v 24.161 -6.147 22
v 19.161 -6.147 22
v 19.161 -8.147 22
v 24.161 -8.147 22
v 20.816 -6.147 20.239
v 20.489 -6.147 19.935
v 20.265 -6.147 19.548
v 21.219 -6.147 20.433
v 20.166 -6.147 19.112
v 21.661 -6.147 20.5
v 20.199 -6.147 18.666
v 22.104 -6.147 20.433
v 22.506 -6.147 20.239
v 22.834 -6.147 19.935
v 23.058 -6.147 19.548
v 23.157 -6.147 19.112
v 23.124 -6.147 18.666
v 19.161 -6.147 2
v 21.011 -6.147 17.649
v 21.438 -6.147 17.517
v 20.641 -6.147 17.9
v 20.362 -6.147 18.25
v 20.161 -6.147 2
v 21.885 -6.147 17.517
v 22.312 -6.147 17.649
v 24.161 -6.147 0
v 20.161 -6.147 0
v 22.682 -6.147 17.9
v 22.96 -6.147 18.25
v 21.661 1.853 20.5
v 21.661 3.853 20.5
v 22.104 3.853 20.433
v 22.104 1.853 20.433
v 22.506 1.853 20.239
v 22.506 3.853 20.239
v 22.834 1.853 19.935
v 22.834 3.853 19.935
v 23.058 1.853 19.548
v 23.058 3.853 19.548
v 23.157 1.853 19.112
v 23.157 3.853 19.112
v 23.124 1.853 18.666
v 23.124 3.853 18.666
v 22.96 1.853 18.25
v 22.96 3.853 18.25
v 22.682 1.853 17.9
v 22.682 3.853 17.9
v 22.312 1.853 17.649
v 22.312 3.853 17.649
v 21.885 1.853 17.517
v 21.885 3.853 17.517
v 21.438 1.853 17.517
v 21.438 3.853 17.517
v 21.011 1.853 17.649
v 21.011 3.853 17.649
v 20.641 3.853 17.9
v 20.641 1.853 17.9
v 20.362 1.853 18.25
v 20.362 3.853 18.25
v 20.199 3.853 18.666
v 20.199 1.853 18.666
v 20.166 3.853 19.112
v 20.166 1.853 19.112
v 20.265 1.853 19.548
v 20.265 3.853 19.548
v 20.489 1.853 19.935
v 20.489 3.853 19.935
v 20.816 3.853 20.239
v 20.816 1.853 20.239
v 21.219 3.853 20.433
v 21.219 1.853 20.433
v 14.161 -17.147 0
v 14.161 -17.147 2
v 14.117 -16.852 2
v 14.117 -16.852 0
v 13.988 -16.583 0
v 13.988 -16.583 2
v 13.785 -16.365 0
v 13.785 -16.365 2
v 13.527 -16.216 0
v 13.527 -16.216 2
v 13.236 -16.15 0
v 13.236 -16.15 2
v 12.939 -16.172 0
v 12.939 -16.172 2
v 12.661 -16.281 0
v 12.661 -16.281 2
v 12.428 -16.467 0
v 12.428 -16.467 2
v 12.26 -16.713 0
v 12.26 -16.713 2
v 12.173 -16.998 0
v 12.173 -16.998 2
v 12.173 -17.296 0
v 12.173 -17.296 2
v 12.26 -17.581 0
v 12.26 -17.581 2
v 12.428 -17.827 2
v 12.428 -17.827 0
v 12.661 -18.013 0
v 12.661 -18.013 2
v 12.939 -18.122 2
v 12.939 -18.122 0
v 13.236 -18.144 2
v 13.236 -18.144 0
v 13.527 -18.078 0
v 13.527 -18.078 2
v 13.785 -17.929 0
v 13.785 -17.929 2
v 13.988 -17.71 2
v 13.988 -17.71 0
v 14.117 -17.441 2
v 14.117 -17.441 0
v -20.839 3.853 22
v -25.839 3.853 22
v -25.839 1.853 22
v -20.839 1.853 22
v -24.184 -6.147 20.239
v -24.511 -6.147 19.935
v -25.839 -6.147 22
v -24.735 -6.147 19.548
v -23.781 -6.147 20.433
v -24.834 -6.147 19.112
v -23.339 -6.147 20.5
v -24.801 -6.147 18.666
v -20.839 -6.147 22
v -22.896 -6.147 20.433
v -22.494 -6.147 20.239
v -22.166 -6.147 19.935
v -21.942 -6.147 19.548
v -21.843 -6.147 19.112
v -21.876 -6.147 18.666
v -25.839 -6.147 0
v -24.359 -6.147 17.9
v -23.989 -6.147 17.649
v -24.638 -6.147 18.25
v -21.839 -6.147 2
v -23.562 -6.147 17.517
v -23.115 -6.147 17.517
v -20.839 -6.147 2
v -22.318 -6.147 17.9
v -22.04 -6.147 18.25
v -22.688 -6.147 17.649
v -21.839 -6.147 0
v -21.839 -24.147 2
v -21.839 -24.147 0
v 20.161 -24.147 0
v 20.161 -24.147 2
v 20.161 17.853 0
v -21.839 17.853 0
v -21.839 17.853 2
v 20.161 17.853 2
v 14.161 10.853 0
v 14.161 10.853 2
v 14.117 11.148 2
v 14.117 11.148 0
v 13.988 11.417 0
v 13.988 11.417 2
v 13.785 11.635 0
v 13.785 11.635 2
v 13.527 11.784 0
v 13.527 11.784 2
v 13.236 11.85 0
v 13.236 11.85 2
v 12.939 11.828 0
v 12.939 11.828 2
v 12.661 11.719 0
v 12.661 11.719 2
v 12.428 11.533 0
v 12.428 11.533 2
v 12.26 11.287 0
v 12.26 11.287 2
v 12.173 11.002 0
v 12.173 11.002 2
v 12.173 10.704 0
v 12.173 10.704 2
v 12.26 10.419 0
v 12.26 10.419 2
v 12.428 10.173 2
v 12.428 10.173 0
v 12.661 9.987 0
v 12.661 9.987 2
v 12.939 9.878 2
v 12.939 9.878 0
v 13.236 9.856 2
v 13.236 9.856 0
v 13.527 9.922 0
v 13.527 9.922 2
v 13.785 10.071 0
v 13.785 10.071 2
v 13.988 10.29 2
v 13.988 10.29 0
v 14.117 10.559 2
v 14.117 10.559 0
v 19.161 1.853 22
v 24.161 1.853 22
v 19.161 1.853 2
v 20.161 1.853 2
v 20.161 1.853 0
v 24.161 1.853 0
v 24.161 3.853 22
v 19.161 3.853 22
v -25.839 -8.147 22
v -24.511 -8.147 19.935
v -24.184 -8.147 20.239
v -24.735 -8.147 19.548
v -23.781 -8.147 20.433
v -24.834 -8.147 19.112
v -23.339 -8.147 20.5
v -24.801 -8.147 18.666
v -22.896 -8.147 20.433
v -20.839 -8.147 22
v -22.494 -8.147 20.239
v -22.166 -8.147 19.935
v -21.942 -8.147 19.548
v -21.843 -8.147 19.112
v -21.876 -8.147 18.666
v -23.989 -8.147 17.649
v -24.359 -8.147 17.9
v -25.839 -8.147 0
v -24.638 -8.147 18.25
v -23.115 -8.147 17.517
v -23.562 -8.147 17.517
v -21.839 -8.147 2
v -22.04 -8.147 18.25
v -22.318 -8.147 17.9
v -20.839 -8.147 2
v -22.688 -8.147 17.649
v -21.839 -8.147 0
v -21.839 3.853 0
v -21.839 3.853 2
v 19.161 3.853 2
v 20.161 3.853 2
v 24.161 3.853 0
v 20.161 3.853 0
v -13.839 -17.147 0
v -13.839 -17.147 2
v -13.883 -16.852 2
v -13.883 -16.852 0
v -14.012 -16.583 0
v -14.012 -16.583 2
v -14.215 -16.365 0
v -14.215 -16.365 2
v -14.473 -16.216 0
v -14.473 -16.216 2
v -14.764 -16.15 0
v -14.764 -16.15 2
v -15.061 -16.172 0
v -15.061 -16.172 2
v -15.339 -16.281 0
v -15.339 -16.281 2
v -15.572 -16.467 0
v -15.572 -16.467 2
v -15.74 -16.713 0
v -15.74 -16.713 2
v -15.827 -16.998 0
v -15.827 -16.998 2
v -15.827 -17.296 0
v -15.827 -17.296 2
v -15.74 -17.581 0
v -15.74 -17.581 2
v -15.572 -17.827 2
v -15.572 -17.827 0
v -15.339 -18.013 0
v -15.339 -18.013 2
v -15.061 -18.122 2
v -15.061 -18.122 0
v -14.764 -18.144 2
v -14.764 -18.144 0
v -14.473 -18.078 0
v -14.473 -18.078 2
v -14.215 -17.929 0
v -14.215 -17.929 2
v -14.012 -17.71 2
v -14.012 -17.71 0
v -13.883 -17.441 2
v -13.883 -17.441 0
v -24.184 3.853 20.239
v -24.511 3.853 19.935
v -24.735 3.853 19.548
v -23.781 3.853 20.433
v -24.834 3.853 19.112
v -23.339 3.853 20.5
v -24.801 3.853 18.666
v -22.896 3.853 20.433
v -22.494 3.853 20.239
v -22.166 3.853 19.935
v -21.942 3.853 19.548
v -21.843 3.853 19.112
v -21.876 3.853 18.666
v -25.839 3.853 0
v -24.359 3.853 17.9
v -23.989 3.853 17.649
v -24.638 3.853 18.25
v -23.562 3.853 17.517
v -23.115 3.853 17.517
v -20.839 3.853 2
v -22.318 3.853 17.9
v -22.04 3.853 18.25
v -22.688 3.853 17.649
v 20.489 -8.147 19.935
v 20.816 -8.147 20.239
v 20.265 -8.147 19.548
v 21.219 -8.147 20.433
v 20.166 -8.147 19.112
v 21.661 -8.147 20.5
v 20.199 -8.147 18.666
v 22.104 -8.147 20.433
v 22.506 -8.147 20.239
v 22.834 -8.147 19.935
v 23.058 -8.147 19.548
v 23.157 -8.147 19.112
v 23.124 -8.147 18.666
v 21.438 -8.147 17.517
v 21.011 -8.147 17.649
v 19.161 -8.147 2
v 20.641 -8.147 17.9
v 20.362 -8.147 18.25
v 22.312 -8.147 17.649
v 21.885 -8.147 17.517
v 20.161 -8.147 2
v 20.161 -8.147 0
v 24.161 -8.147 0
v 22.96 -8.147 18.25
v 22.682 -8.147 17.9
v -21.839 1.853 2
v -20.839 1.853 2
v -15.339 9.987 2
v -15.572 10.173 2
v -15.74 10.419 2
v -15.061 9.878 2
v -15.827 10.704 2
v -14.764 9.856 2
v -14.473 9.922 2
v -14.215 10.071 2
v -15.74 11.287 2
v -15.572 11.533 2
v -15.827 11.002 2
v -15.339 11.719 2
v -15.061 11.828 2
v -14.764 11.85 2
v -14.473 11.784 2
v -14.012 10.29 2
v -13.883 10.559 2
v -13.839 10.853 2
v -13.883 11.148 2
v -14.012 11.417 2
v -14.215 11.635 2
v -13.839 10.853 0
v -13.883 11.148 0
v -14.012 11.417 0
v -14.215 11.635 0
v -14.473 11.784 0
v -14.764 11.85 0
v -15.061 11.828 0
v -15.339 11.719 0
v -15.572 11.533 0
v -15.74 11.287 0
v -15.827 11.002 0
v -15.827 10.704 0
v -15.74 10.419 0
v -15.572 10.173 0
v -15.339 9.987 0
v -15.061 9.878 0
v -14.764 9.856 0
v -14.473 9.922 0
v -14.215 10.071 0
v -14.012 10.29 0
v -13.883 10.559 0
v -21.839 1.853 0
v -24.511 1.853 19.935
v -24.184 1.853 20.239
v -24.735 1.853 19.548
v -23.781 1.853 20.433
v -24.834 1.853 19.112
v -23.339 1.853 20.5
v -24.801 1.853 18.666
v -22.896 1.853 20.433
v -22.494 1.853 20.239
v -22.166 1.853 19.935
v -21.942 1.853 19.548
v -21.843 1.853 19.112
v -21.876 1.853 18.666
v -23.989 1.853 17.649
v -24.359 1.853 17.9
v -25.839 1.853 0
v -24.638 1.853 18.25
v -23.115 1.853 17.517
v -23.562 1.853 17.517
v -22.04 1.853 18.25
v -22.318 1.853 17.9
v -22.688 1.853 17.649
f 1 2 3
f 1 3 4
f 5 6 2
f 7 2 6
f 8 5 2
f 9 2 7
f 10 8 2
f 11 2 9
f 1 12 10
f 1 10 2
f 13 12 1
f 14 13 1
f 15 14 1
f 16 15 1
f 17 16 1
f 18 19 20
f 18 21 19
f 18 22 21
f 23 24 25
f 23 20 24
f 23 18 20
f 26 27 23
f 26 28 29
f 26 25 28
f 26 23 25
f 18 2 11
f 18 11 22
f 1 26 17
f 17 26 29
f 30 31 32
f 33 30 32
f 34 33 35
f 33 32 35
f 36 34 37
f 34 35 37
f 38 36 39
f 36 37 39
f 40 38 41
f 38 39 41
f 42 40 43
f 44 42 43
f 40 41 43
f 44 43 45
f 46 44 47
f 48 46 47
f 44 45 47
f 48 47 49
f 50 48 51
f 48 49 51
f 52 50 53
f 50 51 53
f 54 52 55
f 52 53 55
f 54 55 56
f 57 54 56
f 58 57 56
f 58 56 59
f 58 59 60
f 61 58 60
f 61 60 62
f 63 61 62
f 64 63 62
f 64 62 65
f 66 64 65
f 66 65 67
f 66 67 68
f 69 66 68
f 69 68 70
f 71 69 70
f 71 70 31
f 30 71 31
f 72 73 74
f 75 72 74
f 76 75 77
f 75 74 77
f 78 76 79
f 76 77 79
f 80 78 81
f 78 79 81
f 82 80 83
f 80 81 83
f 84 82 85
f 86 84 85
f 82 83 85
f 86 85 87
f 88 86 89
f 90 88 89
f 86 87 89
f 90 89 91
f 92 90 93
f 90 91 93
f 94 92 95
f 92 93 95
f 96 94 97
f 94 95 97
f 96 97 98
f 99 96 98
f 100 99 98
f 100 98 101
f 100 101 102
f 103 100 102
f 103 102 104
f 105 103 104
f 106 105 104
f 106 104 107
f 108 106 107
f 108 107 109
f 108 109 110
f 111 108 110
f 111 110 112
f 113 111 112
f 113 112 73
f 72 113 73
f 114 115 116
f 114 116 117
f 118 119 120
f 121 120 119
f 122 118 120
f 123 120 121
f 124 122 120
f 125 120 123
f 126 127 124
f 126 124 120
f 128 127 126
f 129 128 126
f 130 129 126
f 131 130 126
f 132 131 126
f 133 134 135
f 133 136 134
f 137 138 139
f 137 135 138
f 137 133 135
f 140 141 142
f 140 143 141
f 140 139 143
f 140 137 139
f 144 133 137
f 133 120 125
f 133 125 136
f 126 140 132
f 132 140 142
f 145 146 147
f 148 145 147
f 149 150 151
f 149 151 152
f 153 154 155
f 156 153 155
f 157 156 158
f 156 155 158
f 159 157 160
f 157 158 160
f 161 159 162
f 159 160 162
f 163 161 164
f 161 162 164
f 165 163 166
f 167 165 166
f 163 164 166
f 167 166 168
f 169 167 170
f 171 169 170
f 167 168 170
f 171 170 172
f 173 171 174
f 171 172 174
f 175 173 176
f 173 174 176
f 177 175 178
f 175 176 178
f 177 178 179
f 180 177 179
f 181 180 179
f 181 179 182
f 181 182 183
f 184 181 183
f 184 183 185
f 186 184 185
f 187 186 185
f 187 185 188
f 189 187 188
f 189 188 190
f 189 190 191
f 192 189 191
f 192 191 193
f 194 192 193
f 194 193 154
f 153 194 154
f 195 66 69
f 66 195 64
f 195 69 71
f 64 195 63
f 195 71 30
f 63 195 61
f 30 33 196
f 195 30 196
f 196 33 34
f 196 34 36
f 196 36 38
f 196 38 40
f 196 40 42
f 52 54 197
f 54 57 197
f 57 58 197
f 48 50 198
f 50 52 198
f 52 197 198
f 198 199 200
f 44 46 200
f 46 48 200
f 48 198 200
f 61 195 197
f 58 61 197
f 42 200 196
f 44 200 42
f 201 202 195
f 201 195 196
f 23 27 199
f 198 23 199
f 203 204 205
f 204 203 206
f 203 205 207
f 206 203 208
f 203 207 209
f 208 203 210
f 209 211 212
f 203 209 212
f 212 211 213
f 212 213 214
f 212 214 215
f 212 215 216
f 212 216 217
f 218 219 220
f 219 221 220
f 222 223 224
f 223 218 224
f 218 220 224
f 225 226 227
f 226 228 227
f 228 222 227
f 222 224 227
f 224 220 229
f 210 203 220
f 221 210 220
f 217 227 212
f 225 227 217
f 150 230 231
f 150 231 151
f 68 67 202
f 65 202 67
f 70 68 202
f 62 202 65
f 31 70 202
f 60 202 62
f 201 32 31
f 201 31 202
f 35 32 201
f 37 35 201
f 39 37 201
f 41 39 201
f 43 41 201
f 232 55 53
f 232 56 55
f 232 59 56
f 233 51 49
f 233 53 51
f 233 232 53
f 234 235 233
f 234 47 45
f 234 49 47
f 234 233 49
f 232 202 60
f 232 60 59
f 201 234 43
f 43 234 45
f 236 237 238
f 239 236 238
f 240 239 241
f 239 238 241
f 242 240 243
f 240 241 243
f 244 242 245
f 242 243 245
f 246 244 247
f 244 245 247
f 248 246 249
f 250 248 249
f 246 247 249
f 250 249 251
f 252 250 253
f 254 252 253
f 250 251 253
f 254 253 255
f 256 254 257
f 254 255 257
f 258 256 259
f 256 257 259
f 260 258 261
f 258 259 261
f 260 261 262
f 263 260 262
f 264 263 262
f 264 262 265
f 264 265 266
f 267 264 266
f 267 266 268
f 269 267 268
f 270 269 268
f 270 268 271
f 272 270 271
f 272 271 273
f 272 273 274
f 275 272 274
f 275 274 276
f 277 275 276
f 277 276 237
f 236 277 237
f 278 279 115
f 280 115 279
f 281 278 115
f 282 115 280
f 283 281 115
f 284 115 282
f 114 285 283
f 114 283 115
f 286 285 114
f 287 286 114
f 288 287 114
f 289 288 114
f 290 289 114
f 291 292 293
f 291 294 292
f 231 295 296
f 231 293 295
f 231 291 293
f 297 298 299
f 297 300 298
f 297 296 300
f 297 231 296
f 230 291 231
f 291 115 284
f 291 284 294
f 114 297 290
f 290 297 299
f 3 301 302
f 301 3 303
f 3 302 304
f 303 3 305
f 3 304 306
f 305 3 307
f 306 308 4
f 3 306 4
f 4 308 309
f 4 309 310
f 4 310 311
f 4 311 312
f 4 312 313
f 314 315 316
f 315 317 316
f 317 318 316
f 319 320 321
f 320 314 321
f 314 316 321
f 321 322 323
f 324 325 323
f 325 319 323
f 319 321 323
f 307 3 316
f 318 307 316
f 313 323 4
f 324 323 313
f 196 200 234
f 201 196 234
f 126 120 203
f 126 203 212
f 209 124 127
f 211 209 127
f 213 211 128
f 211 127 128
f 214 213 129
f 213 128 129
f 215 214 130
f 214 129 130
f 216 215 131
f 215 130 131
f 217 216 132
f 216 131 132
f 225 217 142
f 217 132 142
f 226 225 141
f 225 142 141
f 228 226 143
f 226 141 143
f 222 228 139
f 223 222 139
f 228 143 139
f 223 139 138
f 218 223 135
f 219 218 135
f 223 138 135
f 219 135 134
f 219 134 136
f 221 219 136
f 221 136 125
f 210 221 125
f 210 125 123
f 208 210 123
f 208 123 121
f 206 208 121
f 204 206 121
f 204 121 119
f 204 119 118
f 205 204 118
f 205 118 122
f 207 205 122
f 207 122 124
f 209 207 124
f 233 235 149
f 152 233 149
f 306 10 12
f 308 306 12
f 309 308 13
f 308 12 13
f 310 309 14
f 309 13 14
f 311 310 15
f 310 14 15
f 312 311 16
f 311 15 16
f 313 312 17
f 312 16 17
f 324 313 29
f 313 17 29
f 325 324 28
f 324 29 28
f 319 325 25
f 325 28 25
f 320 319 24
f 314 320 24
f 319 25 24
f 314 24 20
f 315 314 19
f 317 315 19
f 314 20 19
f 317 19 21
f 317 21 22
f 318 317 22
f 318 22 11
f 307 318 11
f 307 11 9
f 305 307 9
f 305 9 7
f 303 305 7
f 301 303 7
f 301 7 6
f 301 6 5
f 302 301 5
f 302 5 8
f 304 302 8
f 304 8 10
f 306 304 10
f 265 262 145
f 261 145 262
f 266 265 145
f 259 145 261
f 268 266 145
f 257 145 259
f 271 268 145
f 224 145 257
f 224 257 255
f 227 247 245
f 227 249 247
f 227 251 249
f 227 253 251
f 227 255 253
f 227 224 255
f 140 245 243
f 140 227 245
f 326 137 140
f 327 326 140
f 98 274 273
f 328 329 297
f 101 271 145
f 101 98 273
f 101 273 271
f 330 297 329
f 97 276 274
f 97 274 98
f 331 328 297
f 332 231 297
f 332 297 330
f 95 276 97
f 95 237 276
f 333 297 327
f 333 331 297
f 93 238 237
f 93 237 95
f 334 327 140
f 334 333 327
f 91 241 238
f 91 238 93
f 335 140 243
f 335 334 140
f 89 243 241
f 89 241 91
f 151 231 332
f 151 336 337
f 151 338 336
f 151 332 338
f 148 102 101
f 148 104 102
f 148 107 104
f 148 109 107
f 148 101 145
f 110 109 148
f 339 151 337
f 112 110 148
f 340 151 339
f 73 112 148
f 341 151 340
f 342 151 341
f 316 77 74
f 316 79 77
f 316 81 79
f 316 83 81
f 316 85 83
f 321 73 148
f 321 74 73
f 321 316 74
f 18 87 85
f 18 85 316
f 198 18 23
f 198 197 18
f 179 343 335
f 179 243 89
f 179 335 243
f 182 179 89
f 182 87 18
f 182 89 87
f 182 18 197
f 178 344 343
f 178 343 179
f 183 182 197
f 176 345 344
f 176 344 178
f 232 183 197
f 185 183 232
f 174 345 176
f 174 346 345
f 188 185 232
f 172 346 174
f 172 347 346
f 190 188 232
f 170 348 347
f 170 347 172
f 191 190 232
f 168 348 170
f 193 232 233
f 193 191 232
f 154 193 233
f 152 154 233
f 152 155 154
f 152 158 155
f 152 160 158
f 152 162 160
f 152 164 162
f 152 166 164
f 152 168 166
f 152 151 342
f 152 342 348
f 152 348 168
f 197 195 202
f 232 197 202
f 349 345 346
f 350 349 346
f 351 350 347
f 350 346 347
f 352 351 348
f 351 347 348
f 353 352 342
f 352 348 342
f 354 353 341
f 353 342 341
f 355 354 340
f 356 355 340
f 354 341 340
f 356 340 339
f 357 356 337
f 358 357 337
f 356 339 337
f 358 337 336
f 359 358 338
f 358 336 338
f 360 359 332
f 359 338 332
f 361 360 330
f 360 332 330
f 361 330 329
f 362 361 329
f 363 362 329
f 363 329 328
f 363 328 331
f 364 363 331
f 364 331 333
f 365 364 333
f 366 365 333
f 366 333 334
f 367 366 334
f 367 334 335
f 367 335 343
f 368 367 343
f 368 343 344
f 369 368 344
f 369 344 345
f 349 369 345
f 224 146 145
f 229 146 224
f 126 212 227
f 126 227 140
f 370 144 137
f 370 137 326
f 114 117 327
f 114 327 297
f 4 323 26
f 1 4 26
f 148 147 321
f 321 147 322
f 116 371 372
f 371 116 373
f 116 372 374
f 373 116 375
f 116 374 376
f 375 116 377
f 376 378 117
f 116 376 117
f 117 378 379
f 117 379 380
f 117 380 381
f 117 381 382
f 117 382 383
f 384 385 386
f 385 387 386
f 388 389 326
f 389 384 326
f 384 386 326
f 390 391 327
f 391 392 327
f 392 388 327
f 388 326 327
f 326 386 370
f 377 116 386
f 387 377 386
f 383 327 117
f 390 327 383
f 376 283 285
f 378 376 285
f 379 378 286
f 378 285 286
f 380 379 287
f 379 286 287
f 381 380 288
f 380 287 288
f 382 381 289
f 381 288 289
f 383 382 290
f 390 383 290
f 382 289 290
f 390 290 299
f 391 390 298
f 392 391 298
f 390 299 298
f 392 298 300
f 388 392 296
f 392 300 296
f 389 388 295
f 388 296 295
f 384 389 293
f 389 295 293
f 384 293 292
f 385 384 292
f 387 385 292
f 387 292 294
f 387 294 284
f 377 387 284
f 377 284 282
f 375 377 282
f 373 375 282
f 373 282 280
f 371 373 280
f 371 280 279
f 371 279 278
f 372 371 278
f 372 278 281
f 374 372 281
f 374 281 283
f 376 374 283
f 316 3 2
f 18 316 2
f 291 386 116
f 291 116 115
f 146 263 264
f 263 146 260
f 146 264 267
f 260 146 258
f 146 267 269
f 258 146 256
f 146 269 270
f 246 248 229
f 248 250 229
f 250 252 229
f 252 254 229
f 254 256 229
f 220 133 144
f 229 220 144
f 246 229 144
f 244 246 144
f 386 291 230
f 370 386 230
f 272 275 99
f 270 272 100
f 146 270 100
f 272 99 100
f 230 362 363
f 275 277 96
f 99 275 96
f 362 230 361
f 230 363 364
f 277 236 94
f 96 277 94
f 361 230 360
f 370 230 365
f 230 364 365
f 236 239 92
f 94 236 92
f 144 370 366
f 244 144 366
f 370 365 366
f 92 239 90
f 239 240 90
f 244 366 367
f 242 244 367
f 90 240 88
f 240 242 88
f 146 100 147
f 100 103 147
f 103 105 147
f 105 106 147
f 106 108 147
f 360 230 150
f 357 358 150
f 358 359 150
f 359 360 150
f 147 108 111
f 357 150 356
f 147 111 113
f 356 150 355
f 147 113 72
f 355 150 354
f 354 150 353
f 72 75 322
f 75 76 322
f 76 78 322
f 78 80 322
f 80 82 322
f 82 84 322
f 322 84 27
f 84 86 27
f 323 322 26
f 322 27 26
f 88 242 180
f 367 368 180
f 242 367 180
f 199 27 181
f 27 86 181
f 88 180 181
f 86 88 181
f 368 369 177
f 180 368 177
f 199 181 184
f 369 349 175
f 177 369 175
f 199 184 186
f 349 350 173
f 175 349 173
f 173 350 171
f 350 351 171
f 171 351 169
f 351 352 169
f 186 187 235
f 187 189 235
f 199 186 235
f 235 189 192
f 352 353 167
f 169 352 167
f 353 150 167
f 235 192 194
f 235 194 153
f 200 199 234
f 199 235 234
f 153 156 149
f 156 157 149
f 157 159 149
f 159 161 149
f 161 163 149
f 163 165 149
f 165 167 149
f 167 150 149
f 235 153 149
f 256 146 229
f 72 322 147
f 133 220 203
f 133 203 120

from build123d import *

# Parameters (mm, degrees)
SKETCH_1_W                  = 42
SKETCH_1_H                  = 42
EXTRUDE_1_DEPTH             = 2
SKETCH_2_R                  = 1
CUT_EXTRUDE_2_DEPTH         = 33.61880943
PATTERN_LINEAR_1_COUNT      = 2
PATTERN_LINEAR_1_PITCH      = 28
PATTERN_LINEAR_1_COUNT_DIR2 = 2
PATTERN_LINEAR_1_PITCH_DIR2 = 28
EXTRUDE_START               = -2
SKETCH_4_W                  = 50
SKETCH_4_H                  = 2
EXTRUDE_2_DEPTH             = 22
SKETCH_7_W                  = 40
SKETCH_7_H                  = 2
CUT_EXTRUDE_3_DEPTH         = 20
PATTERN_LINEAR_2_COUNT      = 2
PATTERN_LINEAR_2_PITCH      = 10
SKETCH_8_R                  = 1.5
CUT_EXTRUDE_4_DEPTH         = 44.995814029
PATTERN_LINEAR_3_COUNT      = 4
PATTERN_LINEAR_3_PITCH      = 5
PATTERN_LINEAR_3_COUNT_DIR2 = 2
PATTERN_LINEAR_3_PITCH_DIR2 = 45


with BuildPart() as part:
    # 草图1 → 凸台-拉伸1 (new body)
    with BuildSketch(Plane.XY):
        with Locations((-0.838569079, -3.146710526)):
            Rectangle(SKETCH_1_W, SKETCH_1_H)
    extrude(amount=EXTRUDE_1_DEPTH)

    # 草图2 → 切除-拉伸2 (cut, through all)
    with BuildSketch(Plane.XY.offset(2)):
        with Locations((-14.838569079, 10.853289474)):
            Circle(SKETCH_2_R)
    cut_extrude_2 = extrude(amount=-CUT_EXTRUDE_2_DEPTH, mode=Mode.SUBTRACT)

    # 阵列(线性)1: Cut-Extrude 2 2 × 2
    with Locations(*[(j * PATTERN_LINEAR_1_PITCH_DIR2, -i * PATTERN_LINEAR_1_PITCH, 0) for i in range(PATTERN_LINEAR_1_COUNT) for j in range(PATTERN_LINEAR_1_COUNT_DIR2) if (i, j) != (0, 0)]):
        add(cut_extrude_2, mode=Mode.SUBTRACT)

    # 草图4 → 凸台-拉伸2 (add)
    with BuildSketch(Plane.XY.offset(2).offset(EXTRUDE_START)):
        with Locations((-0.838569079, 2.853289474)):
            Rectangle(SKETCH_4_W, SKETCH_4_H)
    extrude_2 = extrude(amount=EXTRUDE_2_DEPTH)

    # 草图7 → 切除-拉伸3 (cut)
    with BuildSketch(Plane.XY.offset(22)):
        with Locations((-0.838569079, 2.853289474)):
            Rectangle(SKETCH_7_W, SKETCH_7_H)
    cut_extrude_3 = extrude(amount=-CUT_EXTRUDE_3_DEPTH, mode=Mode.SUBTRACT)

    # 阵列(线性)2: 凸台-拉伸2, 切除-拉伸3 ×2
    with Locations(*[(0, -i * PATTERN_LINEAR_2_PITCH, 0) for i in range(1, PATTERN_LINEAR_2_COUNT)]):
        add(extrude_2)
        add(cut_extrude_3, mode=Mode.SUBTRACT)

    # 草图8 → 切除-拉伸4 (cut, through all)
    with BuildSketch(Plane(origin=(0, 3.853289474, 0), x_dir=(1, 0, 0), z_dir=(0, 1, 0))):
        with Locations(Location((-23.338569079, -19, 0), (0, 0, 270))):
            Circle(SKETCH_8_R)
    cut_extrude_4 = extrude(amount=-CUT_EXTRUDE_4_DEPTH, mode=Mode.SUBTRACT)

    # 阵列(线性)3: Cut-Extrude 4 4 × 2
    with Locations(*[(j * PATTERN_LINEAR_3_PITCH_DIR2, 0, i * PATTERN_LINEAR_3_PITCH) for i in range(PATTERN_LINEAR_3_COUNT) for j in range(PATTERN_LINEAR_3_COUNT_DIR2) if (i, j) != (0, 0)]):
        add(cut_extrude_4, mode=Mode.SUBTRACT)


solid = part.part
